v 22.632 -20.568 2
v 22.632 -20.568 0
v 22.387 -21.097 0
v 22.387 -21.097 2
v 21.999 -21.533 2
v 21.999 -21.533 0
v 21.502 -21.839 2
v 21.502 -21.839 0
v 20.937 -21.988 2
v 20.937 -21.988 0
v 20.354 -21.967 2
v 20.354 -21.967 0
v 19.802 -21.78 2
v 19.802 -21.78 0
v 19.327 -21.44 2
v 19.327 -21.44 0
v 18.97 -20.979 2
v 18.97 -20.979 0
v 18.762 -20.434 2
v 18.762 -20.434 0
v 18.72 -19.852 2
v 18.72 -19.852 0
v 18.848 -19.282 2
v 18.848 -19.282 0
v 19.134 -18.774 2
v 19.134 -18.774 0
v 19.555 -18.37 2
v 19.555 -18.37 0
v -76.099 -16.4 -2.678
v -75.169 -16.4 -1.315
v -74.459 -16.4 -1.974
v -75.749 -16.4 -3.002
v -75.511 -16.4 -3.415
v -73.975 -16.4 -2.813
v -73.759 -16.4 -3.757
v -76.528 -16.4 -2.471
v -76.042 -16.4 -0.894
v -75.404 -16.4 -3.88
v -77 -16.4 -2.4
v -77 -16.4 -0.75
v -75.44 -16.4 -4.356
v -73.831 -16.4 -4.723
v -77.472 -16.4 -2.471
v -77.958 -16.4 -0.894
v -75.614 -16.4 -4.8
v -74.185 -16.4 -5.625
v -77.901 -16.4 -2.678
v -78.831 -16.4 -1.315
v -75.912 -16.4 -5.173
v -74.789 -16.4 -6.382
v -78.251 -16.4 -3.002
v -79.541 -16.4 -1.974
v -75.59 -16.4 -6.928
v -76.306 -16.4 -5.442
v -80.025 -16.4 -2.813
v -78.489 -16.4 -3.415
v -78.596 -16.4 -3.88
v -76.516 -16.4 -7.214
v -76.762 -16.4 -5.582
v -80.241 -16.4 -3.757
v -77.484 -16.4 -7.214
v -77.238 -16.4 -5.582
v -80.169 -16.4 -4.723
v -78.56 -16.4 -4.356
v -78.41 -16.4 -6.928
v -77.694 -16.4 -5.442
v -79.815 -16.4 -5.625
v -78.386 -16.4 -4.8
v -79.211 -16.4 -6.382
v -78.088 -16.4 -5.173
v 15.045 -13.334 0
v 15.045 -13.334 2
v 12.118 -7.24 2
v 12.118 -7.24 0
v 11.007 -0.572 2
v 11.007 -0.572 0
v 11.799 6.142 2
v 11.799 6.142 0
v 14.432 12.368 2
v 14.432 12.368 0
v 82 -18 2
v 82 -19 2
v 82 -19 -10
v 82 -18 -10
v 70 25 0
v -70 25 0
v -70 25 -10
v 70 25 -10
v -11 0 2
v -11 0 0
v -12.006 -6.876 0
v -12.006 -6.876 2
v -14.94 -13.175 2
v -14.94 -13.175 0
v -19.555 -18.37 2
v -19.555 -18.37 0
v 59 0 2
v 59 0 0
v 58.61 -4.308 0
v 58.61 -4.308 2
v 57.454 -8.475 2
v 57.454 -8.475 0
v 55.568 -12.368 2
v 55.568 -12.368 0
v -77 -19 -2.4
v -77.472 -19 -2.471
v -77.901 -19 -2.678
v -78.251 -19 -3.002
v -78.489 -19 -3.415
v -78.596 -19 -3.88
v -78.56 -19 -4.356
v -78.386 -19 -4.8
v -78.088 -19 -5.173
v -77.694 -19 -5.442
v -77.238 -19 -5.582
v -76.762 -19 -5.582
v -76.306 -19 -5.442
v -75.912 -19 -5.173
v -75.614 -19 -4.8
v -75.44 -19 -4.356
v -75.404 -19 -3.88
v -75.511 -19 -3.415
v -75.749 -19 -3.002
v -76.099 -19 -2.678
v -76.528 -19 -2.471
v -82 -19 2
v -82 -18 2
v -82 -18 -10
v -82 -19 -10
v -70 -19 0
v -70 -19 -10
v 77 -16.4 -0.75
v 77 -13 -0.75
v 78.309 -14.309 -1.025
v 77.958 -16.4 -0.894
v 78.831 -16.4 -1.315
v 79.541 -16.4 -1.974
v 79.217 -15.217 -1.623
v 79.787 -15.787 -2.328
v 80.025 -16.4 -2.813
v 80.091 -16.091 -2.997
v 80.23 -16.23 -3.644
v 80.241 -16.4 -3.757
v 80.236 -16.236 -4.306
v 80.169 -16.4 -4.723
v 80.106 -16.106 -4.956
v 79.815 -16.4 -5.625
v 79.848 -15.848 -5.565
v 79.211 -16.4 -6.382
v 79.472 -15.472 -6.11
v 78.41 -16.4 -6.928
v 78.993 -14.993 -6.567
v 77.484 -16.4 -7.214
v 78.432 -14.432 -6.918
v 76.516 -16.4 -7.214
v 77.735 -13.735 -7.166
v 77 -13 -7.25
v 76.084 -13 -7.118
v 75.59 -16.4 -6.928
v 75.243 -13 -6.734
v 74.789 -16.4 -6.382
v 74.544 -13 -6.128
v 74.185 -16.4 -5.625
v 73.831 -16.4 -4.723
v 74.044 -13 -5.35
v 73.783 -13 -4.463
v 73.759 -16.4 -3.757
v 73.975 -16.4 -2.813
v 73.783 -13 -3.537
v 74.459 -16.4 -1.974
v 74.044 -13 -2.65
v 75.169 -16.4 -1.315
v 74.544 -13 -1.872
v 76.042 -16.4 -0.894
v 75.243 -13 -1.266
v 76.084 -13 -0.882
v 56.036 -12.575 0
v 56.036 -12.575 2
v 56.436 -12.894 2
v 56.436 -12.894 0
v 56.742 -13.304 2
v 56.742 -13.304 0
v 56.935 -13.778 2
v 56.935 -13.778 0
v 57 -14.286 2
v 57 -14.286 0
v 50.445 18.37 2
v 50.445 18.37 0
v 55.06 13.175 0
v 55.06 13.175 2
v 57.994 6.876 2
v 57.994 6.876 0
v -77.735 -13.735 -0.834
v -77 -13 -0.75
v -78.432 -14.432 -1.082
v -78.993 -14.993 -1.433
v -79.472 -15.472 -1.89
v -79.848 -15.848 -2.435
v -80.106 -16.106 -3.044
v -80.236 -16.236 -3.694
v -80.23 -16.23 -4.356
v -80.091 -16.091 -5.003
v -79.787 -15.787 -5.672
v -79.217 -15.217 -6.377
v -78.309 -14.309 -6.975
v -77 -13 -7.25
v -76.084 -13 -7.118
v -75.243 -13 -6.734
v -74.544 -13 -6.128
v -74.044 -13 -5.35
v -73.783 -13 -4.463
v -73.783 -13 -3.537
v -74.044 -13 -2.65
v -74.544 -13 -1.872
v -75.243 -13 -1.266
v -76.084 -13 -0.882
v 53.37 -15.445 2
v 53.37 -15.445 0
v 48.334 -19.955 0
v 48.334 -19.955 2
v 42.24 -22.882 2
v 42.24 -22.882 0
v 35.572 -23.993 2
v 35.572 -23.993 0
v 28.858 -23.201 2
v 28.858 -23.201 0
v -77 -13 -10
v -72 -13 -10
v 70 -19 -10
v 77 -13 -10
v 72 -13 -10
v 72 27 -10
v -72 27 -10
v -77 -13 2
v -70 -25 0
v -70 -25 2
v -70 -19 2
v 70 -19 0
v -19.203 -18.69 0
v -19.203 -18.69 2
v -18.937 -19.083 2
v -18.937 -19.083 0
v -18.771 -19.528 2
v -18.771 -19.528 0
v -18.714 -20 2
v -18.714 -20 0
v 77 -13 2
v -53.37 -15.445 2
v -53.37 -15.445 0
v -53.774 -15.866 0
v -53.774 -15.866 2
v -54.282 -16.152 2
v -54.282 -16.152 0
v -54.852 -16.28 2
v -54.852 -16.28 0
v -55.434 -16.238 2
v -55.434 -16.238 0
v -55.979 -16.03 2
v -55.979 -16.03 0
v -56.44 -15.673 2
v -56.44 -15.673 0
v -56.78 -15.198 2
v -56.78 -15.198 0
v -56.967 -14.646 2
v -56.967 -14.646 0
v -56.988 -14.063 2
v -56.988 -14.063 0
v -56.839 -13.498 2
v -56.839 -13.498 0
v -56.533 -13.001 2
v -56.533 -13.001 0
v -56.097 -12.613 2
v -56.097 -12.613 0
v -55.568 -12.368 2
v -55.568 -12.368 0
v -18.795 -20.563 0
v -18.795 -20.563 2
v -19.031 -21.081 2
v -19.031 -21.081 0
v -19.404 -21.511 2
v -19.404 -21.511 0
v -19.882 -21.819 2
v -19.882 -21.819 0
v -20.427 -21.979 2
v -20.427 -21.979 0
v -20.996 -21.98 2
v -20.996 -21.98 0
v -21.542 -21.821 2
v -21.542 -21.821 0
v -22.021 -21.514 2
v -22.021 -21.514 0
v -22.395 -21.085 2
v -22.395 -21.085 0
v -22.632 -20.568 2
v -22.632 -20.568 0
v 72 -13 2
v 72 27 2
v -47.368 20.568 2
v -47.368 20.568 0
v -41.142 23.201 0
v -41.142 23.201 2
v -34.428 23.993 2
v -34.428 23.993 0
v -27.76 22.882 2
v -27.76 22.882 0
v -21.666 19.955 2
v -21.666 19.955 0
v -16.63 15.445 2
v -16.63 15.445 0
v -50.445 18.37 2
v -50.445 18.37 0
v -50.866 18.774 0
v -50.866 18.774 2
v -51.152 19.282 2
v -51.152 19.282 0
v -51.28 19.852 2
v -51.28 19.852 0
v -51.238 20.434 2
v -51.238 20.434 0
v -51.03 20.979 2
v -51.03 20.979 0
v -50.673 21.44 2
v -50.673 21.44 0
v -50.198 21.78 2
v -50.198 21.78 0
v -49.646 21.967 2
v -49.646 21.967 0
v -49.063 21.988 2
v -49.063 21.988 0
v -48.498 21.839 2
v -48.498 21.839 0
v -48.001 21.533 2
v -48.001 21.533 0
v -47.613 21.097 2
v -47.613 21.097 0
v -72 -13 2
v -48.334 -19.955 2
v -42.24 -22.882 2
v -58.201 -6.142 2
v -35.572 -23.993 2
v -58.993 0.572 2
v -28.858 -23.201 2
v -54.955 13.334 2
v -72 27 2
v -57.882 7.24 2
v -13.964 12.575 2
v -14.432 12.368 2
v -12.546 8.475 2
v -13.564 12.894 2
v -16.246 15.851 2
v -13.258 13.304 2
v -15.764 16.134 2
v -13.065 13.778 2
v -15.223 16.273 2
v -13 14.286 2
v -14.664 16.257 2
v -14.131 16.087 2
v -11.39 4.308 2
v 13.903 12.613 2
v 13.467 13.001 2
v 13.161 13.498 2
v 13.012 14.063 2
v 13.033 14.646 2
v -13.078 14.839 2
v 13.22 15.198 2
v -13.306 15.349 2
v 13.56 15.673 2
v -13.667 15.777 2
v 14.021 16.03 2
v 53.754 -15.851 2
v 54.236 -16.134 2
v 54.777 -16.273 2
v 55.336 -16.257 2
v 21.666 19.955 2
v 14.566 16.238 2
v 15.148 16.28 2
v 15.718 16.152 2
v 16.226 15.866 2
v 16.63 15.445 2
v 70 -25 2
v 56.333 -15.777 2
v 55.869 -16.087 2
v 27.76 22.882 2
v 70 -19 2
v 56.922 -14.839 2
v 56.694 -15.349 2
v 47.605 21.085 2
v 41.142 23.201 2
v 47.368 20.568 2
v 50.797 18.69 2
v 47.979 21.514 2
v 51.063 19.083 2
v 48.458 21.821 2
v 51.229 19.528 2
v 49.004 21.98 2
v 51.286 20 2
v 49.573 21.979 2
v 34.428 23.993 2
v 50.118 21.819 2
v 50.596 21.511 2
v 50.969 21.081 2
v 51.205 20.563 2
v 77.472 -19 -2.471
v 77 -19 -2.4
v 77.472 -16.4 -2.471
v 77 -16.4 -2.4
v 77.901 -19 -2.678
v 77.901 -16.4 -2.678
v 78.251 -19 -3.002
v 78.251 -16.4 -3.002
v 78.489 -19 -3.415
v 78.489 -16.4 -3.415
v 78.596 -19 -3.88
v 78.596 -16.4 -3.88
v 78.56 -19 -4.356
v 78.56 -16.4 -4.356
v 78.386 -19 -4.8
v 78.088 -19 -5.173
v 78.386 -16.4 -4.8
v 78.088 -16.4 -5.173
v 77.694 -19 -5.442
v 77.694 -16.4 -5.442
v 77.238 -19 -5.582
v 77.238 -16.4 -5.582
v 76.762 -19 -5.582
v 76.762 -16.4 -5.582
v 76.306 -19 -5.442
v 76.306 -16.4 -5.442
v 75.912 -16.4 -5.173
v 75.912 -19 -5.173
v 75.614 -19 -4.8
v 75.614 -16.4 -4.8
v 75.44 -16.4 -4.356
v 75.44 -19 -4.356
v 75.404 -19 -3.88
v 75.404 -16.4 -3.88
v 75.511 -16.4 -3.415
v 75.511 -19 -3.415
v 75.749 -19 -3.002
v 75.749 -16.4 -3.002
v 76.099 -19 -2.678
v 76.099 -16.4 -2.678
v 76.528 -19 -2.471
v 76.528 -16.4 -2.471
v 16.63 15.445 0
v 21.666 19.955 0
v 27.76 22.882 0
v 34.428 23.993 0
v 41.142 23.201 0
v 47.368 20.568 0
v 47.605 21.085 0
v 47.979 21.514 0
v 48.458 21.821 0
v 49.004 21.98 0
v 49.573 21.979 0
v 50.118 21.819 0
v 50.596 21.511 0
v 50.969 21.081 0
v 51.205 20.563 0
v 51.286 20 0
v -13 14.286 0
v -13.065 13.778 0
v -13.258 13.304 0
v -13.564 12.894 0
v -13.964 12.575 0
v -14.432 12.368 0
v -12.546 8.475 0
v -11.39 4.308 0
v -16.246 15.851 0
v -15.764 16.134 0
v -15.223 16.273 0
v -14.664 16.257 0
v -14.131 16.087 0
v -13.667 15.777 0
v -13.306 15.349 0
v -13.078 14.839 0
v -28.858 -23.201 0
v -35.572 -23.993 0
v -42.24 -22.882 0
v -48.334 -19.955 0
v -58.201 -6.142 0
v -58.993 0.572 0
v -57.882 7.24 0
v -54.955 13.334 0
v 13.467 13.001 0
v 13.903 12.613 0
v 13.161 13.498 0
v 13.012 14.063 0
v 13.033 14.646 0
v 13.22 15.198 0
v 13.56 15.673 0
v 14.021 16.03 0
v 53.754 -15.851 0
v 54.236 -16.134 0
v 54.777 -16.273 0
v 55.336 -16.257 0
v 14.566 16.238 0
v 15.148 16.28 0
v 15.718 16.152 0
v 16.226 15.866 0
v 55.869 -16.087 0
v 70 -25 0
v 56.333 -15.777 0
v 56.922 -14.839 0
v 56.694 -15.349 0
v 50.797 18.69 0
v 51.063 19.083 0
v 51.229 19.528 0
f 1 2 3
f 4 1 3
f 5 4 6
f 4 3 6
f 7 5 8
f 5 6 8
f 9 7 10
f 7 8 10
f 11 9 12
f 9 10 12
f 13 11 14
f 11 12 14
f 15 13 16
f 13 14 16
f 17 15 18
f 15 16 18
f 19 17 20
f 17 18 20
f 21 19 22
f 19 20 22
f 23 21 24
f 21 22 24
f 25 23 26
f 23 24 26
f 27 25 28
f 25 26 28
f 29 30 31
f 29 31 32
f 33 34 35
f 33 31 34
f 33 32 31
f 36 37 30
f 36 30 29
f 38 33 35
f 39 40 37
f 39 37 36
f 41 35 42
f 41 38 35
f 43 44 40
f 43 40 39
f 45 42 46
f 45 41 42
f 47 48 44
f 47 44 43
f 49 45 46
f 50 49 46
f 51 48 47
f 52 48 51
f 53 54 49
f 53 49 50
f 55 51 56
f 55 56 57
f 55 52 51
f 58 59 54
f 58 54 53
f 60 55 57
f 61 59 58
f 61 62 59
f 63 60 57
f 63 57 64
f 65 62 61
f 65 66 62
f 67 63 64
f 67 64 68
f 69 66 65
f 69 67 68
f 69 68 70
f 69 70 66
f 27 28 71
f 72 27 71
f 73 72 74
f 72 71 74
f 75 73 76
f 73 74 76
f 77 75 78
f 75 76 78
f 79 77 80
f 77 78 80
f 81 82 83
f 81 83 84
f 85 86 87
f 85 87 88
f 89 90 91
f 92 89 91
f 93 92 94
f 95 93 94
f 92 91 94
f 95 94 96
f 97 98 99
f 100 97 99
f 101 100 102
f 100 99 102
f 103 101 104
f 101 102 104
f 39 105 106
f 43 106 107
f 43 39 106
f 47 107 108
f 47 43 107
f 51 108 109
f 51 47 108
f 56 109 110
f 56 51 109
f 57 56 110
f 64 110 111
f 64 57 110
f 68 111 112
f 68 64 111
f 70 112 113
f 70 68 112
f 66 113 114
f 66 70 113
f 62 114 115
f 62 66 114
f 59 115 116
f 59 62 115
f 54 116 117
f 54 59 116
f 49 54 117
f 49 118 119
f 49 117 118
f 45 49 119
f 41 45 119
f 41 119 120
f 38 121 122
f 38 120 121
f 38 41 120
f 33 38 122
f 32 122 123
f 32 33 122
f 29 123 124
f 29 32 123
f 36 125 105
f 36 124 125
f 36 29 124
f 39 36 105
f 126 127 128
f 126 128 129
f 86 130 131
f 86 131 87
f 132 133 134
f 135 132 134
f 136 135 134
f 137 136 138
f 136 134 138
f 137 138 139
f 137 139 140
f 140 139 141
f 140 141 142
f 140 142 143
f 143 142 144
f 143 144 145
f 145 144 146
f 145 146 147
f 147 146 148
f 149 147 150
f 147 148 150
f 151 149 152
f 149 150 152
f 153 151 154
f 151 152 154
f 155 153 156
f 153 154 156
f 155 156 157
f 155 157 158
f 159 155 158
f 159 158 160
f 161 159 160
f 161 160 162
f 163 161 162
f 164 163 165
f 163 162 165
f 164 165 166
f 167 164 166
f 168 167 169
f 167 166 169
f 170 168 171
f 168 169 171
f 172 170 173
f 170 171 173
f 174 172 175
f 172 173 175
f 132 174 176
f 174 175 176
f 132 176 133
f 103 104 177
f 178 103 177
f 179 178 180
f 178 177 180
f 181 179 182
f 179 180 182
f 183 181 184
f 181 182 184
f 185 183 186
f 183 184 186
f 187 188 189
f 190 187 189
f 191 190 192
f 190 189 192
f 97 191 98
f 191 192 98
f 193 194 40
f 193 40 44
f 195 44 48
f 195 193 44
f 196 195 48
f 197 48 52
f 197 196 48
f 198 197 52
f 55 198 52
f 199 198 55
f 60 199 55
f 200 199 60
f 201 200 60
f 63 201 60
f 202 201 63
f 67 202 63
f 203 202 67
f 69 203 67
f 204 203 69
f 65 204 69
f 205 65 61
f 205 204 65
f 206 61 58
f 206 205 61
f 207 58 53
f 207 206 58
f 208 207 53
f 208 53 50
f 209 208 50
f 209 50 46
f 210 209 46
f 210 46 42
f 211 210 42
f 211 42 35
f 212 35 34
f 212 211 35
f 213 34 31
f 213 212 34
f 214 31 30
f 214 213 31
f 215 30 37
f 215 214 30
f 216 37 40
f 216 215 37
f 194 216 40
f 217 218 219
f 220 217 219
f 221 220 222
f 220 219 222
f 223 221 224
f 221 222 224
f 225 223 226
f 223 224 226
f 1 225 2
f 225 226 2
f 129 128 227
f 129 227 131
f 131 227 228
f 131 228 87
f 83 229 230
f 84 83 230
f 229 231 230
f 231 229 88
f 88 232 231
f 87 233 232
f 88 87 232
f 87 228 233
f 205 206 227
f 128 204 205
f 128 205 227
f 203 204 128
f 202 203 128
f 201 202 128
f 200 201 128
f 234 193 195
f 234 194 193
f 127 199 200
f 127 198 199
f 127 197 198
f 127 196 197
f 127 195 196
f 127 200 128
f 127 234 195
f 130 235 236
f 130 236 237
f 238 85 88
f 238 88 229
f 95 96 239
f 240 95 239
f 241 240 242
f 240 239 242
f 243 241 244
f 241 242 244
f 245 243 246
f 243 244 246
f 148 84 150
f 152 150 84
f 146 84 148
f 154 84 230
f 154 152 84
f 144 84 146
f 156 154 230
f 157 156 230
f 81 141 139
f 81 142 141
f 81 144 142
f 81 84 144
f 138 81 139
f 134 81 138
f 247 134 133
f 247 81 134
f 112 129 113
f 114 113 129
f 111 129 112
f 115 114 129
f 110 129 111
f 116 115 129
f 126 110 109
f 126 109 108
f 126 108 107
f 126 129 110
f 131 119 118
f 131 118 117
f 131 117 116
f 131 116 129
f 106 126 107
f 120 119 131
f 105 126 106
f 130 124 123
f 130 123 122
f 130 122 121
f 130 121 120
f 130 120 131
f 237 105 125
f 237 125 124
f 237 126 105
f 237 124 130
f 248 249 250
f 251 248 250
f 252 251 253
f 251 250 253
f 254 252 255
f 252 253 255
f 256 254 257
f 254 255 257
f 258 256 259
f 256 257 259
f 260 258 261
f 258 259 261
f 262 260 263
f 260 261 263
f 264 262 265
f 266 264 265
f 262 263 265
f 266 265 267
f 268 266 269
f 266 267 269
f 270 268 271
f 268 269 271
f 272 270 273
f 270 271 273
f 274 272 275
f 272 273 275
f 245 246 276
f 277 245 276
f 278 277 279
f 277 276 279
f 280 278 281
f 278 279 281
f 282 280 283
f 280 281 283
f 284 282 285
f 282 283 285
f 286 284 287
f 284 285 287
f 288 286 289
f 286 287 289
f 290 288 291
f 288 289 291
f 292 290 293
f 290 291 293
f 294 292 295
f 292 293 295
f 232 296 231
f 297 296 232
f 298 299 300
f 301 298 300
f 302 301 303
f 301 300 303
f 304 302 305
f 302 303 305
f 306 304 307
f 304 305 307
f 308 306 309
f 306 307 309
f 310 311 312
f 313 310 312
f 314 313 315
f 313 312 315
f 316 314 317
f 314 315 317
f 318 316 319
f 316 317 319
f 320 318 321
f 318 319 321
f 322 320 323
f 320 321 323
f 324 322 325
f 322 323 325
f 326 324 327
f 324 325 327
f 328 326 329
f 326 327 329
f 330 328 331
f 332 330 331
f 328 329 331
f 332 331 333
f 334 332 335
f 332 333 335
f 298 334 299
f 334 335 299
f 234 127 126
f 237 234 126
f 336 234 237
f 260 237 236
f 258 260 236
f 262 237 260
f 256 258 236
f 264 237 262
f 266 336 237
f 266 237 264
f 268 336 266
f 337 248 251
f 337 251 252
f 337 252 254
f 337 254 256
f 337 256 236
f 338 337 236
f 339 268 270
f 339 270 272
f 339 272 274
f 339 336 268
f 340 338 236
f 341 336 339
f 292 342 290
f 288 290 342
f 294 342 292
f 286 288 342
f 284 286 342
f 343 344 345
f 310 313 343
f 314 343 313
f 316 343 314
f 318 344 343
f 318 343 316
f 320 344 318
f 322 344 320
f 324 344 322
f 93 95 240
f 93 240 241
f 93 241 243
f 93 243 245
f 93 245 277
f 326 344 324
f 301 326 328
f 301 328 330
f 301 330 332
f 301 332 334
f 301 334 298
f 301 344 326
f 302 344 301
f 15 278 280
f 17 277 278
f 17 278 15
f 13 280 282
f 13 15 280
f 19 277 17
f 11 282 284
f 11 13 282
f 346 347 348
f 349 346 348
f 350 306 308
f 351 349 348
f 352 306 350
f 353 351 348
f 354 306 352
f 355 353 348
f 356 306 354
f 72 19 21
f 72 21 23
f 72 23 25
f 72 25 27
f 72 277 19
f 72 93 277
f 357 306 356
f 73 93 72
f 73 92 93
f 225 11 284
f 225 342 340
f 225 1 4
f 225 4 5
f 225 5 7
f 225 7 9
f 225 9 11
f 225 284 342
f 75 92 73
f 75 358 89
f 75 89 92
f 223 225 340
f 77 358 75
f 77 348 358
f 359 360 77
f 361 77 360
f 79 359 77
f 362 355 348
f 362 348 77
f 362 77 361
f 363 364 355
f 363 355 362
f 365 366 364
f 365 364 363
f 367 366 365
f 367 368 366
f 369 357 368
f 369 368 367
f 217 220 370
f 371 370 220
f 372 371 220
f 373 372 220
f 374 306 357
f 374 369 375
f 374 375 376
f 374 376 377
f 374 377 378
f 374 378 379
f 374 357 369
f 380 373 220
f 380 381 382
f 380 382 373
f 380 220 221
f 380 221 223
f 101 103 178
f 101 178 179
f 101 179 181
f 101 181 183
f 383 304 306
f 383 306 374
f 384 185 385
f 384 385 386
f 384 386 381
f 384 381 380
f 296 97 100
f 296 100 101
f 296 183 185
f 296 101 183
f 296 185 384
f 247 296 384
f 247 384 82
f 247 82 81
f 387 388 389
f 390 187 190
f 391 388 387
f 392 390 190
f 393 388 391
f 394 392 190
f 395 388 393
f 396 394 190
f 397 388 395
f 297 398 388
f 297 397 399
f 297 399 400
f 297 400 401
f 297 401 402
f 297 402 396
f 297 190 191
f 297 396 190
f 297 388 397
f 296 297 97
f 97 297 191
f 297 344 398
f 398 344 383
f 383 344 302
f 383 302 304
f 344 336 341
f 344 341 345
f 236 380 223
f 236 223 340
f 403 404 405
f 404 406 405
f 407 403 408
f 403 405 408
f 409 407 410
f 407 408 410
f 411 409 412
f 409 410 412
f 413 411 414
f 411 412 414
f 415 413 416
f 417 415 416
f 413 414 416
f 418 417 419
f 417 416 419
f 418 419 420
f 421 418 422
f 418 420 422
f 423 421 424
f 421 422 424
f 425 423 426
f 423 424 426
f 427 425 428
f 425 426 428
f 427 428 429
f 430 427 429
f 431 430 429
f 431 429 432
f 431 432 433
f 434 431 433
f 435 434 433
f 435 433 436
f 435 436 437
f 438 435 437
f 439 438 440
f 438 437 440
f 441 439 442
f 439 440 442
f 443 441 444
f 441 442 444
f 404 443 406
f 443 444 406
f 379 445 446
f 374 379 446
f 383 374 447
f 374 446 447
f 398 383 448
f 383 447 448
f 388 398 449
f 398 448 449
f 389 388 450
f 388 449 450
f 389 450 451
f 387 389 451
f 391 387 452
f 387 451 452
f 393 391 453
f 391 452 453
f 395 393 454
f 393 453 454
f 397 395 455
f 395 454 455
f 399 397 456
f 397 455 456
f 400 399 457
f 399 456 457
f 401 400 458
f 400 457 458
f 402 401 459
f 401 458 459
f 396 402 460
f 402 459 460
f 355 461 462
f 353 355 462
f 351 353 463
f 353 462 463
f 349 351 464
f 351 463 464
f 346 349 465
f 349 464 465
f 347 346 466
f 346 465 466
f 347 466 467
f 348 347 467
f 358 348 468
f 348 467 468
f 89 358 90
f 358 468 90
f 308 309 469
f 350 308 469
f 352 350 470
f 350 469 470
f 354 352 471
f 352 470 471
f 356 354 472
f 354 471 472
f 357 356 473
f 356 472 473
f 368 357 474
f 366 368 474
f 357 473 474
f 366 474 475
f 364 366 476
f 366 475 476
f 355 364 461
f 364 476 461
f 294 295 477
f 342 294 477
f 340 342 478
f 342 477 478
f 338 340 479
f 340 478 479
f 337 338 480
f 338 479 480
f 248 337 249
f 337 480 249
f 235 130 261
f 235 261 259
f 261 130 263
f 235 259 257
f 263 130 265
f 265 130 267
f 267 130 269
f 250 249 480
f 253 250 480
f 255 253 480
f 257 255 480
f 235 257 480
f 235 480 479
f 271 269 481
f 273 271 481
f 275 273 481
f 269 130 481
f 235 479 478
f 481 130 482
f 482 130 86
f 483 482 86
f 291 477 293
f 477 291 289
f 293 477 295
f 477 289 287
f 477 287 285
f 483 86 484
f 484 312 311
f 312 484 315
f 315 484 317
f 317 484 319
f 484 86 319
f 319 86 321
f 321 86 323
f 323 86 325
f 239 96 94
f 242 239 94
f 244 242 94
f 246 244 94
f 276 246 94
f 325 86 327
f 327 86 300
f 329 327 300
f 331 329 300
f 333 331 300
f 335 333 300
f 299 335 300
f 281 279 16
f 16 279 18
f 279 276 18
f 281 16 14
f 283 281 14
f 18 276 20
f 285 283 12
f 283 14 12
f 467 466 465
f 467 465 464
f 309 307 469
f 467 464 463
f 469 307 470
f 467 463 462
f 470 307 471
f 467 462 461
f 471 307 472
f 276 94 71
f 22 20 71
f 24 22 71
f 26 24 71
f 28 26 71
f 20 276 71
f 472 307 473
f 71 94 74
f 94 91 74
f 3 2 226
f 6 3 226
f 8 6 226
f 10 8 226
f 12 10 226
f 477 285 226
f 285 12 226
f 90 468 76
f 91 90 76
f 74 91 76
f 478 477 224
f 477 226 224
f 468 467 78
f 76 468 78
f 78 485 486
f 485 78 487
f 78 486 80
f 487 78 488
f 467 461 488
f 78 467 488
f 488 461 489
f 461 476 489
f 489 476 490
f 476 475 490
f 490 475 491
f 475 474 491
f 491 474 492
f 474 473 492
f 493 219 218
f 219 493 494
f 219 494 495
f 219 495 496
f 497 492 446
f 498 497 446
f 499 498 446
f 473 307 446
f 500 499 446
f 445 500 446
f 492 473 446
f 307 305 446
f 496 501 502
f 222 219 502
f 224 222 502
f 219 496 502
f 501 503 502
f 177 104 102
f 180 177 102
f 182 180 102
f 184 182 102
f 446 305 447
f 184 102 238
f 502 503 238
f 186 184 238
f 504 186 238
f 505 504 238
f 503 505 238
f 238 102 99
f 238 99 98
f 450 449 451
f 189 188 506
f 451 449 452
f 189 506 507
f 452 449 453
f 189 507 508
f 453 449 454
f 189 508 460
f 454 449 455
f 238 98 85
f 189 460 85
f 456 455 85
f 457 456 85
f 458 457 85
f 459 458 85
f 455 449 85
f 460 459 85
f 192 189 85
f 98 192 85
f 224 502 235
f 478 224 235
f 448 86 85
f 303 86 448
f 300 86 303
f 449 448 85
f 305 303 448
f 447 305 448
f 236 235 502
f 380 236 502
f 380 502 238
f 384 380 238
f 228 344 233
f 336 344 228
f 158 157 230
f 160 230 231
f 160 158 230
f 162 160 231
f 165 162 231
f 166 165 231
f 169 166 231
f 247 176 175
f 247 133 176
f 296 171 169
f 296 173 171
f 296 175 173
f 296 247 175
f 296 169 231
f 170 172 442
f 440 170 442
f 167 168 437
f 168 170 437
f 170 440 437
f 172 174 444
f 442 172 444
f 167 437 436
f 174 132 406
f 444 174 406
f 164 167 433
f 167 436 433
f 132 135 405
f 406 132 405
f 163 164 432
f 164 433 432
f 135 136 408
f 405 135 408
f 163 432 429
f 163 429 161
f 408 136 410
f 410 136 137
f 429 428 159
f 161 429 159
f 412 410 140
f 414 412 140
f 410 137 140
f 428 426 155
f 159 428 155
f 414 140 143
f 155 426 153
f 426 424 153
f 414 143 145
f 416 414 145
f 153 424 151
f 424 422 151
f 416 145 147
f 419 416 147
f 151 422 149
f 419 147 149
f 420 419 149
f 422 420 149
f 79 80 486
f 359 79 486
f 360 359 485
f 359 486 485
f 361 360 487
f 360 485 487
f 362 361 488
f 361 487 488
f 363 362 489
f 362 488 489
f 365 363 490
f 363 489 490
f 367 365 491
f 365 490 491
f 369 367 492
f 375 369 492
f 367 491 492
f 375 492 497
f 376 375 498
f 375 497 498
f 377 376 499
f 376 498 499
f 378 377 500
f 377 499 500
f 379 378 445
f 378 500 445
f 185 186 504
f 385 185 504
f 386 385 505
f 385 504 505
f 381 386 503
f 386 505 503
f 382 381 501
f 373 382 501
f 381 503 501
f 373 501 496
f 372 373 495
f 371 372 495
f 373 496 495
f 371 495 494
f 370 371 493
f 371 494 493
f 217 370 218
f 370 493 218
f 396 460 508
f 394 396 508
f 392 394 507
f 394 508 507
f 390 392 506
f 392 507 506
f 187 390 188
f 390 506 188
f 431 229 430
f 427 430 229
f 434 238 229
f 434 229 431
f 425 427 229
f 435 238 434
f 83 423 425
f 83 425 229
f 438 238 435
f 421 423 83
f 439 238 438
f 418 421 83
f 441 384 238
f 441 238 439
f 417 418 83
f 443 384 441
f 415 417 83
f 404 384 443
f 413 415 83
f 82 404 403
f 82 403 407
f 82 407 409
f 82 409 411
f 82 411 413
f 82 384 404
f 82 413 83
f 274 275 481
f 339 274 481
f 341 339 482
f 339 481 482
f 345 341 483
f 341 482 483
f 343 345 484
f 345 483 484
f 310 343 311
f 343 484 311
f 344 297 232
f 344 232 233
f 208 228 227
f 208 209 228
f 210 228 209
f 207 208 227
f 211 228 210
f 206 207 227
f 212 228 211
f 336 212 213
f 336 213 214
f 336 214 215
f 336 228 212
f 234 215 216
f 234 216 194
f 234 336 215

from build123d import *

# Parameters (mm, degrees)
SZKIC1_W                    = 140
SZKIC1_H                    = 50
DODANIE_WYCI_GNI_CIE1_DEPTH = 2
DODANIE_WYCI_GNI_CIE2_DEPTH = 12
SFAZOWANIE1_SIZE            = 5


with BuildPart() as part:
    # Szkic1 → Dodanie-wyciągnięcie1 (new body)
    with BuildSketch(Plane.XY):
        Rectangle(SZKIC1_W, SZKIC1_H)
        with BuildLine():
            ThreePointArc((-14.432240892, 12.367994391), (-11.873973335, 6.417701356), (-11, 0))
            ThreePointArc((-11, 0), (-13.243691419, -10.132276987), (-19.555253078, -18.370078729))
            ThreePointArc((-19.555253078, -18.370078729), (-18.936918944, -19.082957273), (-18.714285714, -20))
            ThreePointArc((-18.714285714, -20), (-20.427440625, -21.97932309), (-22.632005609, -20.567759108))
            ThreePointArc((-22.632005609, -20.567759108), (-38.945575695, -23.673454172), (-53.370078729, -15.444746922))
            ThreePointArc((-53.370078729, -15.444746922), (-56.627466942, -15.448190673), (-55.567759108, -12.367994391))
            ThreePointArc((-55.567759108, -12.367994391), (-58.673454172, 3.945575695), (-50.444746922, 18.370078729))
            ThreePointArc((-50.444746922, 18.370078729), (-50.448190673, 21.627466942), (-47.367994391, 20.567759108))
            ThreePointArc((-47.367994391, 20.567759108), (-31.054424305, 23.673454172), (-16.629921271, 15.444746922))
            ThreePointArc((-16.629921271, 15.444746922), (-14.391659035, 16.190949513), (-13, 14.285714286))
            ThreePointArc((-13, 14.285714286), (-13.397577113, 13.088951614), (-14.432240892, 12.367994391))
        make_face(mode=Mode.SUBTRACT)
        with BuildLine():
            ThreePointArc((50.444746922, 18.370078729), (56.756308581, 10.132276987), (59, 0))
            ThreePointArc((59, 0), (58.126026665, -6.417701356), (55.567759108, -12.367994391))
            ThreePointArc((55.567759108, -12.367994391), (56.602422887, -13.088951614), (57, -14.285714286))
            ThreePointArc((57, -14.285714286), (55.608340965, -16.190949513), (53.370078729, -15.444746922))
            ThreePointArc((53.370078729, -15.444746922), (38.945575695, -23.673454172), (22.632005609, -20.567759108))
            ThreePointArc((22.632005609, -20.567759108), (19.551809327, -21.627466942), (19.555253078, -18.370078729))
            ThreePointArc((19.555253078, -18.370078729), (11.326545828, -3.945575695), (14.432240892, 12.367994391))
            ThreePointArc((14.432240892, 12.367994391), (13.372533058, 15.448190673), (16.629921271, 15.444746922))
            ThreePointArc((16.629921271, 15.444746922), (31.054424305, 23.673454172), (47.367994391, 20.567759108))
            ThreePointArc((47.367994391, 20.567759108), (49.572559375, 21.97932309), (51.285714286, 20))
            ThreePointArc((51.285714286, 20), (51.063081056, 19.082957273), (50.444746922, 18.370078729))
        make_face(mode=Mode.SUBTRACT)
    extrude(amount=DODANIE_WYCI_GNI_CIE1_DEPTH)

    # Szkic2 → Dodanie-wyciągnięcie2 (add)
    with BuildSketch(Plane.XY.offset(2)):
        Polygon((70, 25), (70, -19), (82, -19), (82, -13), (72, -13), (72, 27), (-72, 27), (-72, -13), (-82, -13), (-82, -19), (-70, -19), (-70, 25), align=None)
    extrude(amount=-DODANIE_WYCI_GNI_CIE2_DEPTH)

    # Szkic4 → CBORE for M3 Hex Socket Head Cap Screw1 (revolve, cut)
    with BuildSketch(Plane(origin=(-77, -13, -4), x_dir=(0, 0, 1), z_dir=(1, 0, 0))):
        Polygon((0, 0), (0, 8.66137699), (1.6, 7.7), (1.6, 3.4), (3.25, 3.4), (3.25, 0), align=None)
    cbore_for_m3_hex_socket_head_cap_screw1 = revolve(axis=Axis((-77, -6.65, -4), (0, -1, 0)), mode=Mode.SUBTRACT)

    # Lustro1: CBORE for M3 Hex Socket Head Cap Screw1 across plane
    add(cbore_for_m3_hex_socket_head_cap_screw1.mirror(Plane(origin=(0, 0, 0), x_dir=(0, 0, 1), z_dir=(1, 0, 0))), mode=Mode.SUBTRACT)

    # Sfazowanie1
    # the kernel refuses this chamfer: 5 mm, written as the material it takes off along each edge
    with BuildSketch(Plane(origin=(-82, -13, 14.85841494), x_dir=(0.9996219169112968, 0.027495876610586625, 0), z_dir=(0, 0, -1)), Plane(origin=(82, -13, 14.85841494), x_dir=(0.027495876610590466, -0.9996219169112965, 0), z_dir=(0, 0, -1))) as sfazowanie1_piece_1:
        Polygon((SFAZOWANIE1_SIZE * 0.999621916911, SFAZOWANIE1_SIZE * 0.0274958766106), (-SFAZOWANIE1_SIZE * 0.0274958766106, SFAZOWANIE1_SIZE * 0.999621916911), (0, 0), align=None)
    extrude(amount=37.71682988, mode=Mode.SUBTRACT)


solid = part.part
